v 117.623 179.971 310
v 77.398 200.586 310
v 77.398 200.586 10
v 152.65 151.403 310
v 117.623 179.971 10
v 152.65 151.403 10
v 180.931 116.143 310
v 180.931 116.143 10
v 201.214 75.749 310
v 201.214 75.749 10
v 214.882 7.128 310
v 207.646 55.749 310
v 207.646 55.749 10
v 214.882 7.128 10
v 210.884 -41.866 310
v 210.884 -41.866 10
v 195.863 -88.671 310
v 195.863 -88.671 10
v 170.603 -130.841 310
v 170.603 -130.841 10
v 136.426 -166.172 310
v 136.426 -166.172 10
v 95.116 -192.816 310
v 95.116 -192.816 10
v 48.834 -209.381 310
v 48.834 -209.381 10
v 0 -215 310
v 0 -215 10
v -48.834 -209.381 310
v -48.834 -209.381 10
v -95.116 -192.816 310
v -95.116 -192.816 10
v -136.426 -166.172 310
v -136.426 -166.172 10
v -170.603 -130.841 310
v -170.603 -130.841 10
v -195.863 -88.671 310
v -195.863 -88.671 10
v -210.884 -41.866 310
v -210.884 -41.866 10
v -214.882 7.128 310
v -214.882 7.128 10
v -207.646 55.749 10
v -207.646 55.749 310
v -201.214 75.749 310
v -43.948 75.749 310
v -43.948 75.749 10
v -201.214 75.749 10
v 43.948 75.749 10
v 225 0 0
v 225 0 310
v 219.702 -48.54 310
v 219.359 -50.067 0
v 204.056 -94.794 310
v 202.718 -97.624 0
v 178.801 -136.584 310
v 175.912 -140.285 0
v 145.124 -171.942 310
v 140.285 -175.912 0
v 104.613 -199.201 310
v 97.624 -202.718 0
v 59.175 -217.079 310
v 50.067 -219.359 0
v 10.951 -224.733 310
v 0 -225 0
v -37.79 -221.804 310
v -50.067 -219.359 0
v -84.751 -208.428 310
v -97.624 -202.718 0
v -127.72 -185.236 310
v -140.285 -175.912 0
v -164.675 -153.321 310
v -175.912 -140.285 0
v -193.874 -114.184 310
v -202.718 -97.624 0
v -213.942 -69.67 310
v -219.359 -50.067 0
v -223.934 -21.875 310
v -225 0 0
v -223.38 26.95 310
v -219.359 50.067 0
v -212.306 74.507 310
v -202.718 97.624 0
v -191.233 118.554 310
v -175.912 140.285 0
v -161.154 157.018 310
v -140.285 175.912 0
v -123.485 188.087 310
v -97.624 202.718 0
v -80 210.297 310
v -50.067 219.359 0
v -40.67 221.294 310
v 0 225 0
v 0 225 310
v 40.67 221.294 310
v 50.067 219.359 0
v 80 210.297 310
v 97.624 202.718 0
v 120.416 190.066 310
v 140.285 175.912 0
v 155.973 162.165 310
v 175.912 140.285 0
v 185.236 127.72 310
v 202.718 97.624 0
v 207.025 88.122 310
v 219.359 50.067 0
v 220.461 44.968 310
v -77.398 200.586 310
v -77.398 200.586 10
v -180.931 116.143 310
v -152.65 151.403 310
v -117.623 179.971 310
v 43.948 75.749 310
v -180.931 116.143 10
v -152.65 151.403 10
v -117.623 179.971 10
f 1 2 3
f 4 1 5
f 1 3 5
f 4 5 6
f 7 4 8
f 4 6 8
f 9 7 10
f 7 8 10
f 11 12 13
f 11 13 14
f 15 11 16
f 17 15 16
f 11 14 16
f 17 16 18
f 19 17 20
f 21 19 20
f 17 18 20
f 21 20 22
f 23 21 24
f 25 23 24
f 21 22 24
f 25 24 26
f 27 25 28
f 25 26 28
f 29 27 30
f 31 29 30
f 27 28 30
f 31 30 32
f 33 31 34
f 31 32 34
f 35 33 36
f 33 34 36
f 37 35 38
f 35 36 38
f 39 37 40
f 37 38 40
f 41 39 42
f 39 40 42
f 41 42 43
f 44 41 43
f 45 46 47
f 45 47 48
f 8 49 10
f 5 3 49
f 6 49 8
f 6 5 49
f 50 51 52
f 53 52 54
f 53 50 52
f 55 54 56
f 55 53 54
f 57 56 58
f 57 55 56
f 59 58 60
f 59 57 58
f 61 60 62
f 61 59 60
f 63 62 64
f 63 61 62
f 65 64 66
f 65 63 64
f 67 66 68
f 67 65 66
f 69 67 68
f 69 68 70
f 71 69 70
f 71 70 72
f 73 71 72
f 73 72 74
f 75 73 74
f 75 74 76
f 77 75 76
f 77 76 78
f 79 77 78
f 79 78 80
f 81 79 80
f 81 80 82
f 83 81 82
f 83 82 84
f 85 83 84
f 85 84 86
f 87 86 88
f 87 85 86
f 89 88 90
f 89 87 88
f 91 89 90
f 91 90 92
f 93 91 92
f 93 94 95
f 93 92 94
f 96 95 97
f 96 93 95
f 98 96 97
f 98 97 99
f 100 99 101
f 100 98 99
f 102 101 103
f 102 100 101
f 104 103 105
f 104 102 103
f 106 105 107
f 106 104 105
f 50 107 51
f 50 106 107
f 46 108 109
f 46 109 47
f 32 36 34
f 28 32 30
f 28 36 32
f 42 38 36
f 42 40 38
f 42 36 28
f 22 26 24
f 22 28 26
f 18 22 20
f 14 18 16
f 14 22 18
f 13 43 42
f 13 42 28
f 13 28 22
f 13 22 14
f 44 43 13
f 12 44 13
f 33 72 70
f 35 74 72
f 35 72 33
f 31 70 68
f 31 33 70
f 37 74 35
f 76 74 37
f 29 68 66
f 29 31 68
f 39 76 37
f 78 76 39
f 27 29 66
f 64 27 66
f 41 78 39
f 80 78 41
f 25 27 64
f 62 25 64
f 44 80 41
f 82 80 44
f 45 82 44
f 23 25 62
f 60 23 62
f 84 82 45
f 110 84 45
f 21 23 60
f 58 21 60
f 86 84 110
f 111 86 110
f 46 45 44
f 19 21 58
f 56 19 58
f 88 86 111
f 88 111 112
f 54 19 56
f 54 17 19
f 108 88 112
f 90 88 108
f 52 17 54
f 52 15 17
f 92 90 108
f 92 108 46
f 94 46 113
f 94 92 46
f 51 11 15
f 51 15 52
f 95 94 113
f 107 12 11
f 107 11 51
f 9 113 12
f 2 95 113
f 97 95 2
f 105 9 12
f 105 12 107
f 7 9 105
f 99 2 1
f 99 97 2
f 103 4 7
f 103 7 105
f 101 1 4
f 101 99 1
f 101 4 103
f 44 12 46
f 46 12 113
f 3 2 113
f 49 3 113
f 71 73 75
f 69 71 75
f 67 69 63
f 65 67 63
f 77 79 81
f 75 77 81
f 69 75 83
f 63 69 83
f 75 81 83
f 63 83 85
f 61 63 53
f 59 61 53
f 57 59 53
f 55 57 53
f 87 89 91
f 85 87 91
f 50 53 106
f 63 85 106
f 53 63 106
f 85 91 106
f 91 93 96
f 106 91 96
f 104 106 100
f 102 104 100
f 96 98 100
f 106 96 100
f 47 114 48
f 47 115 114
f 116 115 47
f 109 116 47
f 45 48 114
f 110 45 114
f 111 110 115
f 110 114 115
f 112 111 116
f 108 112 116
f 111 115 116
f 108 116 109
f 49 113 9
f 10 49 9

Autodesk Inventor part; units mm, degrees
ref_plane "YZ Plane" through (0, 0, 0) normal (1, 0, 0) x (0, 1, 0)
ref_plane "XZ Plane" through (0, 0, 0) normal (0, 1, 0) x (-1, 0, 0)
ref_plane "XY Plane" through (0, 0, 0) normal (0, 0, 1) x (1, 0, 0)
sketch "Sketch1" plane through (0, 0, 0) normal (0, 0, 1) x (1, 0, 0)
  circle A0 centre (0, 0) radius 225
  dimension "d0" = 450
extrude "Extrusion1" add sketch "Sketch1" along normal blind 10
sketch "Sketch2" plane through (0, 0, 10) normal (0, 0, 1) x (1, 0, 0)
  circle A0 centre (0, 0) radius 225
  circle A1 centre (0, 0) radius 215
  dimension "d3" = 450
  dimension "d4" = 10
extrude "Extrusion2" add sketch "Sketch2" along normal blind 300
sketch "Sketch5" plane through (0, 0, 10) normal (0, 0, 1) x (1, 0, 0)
  line L0 (-80, 210.2974) -> (80, 210.2974)
  line L1 (80, 210.2974) -> (38.589, 55.7493)
  line L2 (-80, 210.2974) -> (-38.589, 55.7493)
  line L3 (-80, 210.2974) -> (80, 210.2974) construction
  line L4 (-38.589, 55.7493) -> (38.589, 55.7493)
  circle A0 centre (0, 0) radius 225 projected
  dimension "d31" = 160
  dimension "d32" = 160
  dimension "d33" = 75
  dimension "d34" = 160
  dimension "d35" = 75
extrude "Extrusion5" add sketch "Sketch5" along normal blind 300 contours L0 L1 L4 L2
sketch "Sketch6" plane through (0, 0, 10) normal (0, 0, 1) x (1, 0, 0)
  line L0 (-77.3977, 200.5856) -> (-38.589, 55.7493) projected
  line L1 (-38.589, 55.7493) -> (-207.6464, 55.7493)
  arc A0 (-77.3977, 200.5856) -> (77.3977, 200.5856) centre (0, 0) ccw projected
  line L2 (-38.589, 55.7493) -> (38.589, 55.7493) projected
  line L3 (38.589, 55.7493) -> (207.6464, 55.7493)
  line L4 (43.9479, 75.7493) -> (201.2139, 75.7493)
  circle A1 centre (0, 0) radius 225 projected
  line L5 (-43.9479, 75.7493) -> (-211.8656, 75.7493)
  line L6 (-43.9479, 75.7493) -> (-38.589, 55.7493)
  line L7 (43.9479, 75.7493) -> (38.589, 55.7493)
  arc A2 (207.6464, 55.7493) -> (201.2139, 75.7493) centre (0, 0) ccw
  arc A3 (-201.2139, 75.7493) -> (-207.6464, 55.7493) centre (0, 0) ccw
  line L8 (38.589, 55.7493) -> (77.3977, 200.5856) projected
  dimension "d38" = 20
extrude "Extrusion6" add sketch "Sketch6" along normal blind 300 contours L0 L1 A0 L5 | L7 L4 A0 L3
sketch "Sketch7" plane through (0, 0, 10) normal (0, 0, 1) x (1, 0, 0)
  arc A0 (-77.3977, 200.5856) -> (-201.2139, 75.7493) centre (0, 0) ccw projected
  line L0 (-77.3977, 200.5856) -> (-43.9479, 75.7493) projected
  line L1 (-43.9479, 75.7493) -> (-201.2139, 75.7493) projected
  line L2 (-207.6464, 55.7493) -> (207.6464, 55.7493) projected
  arc A1 (-207.6464, 55.7493) -> (207.6464, 55.7493) centre (0, 0) ccw projected
  line L3 (201.2139, 75.7493) -> (43.9479, 75.7493) projected
  line L4 (43.9479, 75.7493) -> (77.3977, 200.5856) projected
  arc A2 (201.2139, 75.7493) -> (77.3977, 200.5856) centre (0, 0) ccw projected
  line L5 (44.7214, 210.2974) -> (-44.7214, 210.2974) projected
  arc A3 (44.7214, 210.2974) -> (-44.7214, 210.2974) centre (0, 0) ccw projected
  circle A4 centre (0, 0) radius 225 projected
extrude "Extrusion7" add sketch "Sketch7" along normal blind 300 contours L5 A3
properties part number "BA001" material "ABS Plastic"
